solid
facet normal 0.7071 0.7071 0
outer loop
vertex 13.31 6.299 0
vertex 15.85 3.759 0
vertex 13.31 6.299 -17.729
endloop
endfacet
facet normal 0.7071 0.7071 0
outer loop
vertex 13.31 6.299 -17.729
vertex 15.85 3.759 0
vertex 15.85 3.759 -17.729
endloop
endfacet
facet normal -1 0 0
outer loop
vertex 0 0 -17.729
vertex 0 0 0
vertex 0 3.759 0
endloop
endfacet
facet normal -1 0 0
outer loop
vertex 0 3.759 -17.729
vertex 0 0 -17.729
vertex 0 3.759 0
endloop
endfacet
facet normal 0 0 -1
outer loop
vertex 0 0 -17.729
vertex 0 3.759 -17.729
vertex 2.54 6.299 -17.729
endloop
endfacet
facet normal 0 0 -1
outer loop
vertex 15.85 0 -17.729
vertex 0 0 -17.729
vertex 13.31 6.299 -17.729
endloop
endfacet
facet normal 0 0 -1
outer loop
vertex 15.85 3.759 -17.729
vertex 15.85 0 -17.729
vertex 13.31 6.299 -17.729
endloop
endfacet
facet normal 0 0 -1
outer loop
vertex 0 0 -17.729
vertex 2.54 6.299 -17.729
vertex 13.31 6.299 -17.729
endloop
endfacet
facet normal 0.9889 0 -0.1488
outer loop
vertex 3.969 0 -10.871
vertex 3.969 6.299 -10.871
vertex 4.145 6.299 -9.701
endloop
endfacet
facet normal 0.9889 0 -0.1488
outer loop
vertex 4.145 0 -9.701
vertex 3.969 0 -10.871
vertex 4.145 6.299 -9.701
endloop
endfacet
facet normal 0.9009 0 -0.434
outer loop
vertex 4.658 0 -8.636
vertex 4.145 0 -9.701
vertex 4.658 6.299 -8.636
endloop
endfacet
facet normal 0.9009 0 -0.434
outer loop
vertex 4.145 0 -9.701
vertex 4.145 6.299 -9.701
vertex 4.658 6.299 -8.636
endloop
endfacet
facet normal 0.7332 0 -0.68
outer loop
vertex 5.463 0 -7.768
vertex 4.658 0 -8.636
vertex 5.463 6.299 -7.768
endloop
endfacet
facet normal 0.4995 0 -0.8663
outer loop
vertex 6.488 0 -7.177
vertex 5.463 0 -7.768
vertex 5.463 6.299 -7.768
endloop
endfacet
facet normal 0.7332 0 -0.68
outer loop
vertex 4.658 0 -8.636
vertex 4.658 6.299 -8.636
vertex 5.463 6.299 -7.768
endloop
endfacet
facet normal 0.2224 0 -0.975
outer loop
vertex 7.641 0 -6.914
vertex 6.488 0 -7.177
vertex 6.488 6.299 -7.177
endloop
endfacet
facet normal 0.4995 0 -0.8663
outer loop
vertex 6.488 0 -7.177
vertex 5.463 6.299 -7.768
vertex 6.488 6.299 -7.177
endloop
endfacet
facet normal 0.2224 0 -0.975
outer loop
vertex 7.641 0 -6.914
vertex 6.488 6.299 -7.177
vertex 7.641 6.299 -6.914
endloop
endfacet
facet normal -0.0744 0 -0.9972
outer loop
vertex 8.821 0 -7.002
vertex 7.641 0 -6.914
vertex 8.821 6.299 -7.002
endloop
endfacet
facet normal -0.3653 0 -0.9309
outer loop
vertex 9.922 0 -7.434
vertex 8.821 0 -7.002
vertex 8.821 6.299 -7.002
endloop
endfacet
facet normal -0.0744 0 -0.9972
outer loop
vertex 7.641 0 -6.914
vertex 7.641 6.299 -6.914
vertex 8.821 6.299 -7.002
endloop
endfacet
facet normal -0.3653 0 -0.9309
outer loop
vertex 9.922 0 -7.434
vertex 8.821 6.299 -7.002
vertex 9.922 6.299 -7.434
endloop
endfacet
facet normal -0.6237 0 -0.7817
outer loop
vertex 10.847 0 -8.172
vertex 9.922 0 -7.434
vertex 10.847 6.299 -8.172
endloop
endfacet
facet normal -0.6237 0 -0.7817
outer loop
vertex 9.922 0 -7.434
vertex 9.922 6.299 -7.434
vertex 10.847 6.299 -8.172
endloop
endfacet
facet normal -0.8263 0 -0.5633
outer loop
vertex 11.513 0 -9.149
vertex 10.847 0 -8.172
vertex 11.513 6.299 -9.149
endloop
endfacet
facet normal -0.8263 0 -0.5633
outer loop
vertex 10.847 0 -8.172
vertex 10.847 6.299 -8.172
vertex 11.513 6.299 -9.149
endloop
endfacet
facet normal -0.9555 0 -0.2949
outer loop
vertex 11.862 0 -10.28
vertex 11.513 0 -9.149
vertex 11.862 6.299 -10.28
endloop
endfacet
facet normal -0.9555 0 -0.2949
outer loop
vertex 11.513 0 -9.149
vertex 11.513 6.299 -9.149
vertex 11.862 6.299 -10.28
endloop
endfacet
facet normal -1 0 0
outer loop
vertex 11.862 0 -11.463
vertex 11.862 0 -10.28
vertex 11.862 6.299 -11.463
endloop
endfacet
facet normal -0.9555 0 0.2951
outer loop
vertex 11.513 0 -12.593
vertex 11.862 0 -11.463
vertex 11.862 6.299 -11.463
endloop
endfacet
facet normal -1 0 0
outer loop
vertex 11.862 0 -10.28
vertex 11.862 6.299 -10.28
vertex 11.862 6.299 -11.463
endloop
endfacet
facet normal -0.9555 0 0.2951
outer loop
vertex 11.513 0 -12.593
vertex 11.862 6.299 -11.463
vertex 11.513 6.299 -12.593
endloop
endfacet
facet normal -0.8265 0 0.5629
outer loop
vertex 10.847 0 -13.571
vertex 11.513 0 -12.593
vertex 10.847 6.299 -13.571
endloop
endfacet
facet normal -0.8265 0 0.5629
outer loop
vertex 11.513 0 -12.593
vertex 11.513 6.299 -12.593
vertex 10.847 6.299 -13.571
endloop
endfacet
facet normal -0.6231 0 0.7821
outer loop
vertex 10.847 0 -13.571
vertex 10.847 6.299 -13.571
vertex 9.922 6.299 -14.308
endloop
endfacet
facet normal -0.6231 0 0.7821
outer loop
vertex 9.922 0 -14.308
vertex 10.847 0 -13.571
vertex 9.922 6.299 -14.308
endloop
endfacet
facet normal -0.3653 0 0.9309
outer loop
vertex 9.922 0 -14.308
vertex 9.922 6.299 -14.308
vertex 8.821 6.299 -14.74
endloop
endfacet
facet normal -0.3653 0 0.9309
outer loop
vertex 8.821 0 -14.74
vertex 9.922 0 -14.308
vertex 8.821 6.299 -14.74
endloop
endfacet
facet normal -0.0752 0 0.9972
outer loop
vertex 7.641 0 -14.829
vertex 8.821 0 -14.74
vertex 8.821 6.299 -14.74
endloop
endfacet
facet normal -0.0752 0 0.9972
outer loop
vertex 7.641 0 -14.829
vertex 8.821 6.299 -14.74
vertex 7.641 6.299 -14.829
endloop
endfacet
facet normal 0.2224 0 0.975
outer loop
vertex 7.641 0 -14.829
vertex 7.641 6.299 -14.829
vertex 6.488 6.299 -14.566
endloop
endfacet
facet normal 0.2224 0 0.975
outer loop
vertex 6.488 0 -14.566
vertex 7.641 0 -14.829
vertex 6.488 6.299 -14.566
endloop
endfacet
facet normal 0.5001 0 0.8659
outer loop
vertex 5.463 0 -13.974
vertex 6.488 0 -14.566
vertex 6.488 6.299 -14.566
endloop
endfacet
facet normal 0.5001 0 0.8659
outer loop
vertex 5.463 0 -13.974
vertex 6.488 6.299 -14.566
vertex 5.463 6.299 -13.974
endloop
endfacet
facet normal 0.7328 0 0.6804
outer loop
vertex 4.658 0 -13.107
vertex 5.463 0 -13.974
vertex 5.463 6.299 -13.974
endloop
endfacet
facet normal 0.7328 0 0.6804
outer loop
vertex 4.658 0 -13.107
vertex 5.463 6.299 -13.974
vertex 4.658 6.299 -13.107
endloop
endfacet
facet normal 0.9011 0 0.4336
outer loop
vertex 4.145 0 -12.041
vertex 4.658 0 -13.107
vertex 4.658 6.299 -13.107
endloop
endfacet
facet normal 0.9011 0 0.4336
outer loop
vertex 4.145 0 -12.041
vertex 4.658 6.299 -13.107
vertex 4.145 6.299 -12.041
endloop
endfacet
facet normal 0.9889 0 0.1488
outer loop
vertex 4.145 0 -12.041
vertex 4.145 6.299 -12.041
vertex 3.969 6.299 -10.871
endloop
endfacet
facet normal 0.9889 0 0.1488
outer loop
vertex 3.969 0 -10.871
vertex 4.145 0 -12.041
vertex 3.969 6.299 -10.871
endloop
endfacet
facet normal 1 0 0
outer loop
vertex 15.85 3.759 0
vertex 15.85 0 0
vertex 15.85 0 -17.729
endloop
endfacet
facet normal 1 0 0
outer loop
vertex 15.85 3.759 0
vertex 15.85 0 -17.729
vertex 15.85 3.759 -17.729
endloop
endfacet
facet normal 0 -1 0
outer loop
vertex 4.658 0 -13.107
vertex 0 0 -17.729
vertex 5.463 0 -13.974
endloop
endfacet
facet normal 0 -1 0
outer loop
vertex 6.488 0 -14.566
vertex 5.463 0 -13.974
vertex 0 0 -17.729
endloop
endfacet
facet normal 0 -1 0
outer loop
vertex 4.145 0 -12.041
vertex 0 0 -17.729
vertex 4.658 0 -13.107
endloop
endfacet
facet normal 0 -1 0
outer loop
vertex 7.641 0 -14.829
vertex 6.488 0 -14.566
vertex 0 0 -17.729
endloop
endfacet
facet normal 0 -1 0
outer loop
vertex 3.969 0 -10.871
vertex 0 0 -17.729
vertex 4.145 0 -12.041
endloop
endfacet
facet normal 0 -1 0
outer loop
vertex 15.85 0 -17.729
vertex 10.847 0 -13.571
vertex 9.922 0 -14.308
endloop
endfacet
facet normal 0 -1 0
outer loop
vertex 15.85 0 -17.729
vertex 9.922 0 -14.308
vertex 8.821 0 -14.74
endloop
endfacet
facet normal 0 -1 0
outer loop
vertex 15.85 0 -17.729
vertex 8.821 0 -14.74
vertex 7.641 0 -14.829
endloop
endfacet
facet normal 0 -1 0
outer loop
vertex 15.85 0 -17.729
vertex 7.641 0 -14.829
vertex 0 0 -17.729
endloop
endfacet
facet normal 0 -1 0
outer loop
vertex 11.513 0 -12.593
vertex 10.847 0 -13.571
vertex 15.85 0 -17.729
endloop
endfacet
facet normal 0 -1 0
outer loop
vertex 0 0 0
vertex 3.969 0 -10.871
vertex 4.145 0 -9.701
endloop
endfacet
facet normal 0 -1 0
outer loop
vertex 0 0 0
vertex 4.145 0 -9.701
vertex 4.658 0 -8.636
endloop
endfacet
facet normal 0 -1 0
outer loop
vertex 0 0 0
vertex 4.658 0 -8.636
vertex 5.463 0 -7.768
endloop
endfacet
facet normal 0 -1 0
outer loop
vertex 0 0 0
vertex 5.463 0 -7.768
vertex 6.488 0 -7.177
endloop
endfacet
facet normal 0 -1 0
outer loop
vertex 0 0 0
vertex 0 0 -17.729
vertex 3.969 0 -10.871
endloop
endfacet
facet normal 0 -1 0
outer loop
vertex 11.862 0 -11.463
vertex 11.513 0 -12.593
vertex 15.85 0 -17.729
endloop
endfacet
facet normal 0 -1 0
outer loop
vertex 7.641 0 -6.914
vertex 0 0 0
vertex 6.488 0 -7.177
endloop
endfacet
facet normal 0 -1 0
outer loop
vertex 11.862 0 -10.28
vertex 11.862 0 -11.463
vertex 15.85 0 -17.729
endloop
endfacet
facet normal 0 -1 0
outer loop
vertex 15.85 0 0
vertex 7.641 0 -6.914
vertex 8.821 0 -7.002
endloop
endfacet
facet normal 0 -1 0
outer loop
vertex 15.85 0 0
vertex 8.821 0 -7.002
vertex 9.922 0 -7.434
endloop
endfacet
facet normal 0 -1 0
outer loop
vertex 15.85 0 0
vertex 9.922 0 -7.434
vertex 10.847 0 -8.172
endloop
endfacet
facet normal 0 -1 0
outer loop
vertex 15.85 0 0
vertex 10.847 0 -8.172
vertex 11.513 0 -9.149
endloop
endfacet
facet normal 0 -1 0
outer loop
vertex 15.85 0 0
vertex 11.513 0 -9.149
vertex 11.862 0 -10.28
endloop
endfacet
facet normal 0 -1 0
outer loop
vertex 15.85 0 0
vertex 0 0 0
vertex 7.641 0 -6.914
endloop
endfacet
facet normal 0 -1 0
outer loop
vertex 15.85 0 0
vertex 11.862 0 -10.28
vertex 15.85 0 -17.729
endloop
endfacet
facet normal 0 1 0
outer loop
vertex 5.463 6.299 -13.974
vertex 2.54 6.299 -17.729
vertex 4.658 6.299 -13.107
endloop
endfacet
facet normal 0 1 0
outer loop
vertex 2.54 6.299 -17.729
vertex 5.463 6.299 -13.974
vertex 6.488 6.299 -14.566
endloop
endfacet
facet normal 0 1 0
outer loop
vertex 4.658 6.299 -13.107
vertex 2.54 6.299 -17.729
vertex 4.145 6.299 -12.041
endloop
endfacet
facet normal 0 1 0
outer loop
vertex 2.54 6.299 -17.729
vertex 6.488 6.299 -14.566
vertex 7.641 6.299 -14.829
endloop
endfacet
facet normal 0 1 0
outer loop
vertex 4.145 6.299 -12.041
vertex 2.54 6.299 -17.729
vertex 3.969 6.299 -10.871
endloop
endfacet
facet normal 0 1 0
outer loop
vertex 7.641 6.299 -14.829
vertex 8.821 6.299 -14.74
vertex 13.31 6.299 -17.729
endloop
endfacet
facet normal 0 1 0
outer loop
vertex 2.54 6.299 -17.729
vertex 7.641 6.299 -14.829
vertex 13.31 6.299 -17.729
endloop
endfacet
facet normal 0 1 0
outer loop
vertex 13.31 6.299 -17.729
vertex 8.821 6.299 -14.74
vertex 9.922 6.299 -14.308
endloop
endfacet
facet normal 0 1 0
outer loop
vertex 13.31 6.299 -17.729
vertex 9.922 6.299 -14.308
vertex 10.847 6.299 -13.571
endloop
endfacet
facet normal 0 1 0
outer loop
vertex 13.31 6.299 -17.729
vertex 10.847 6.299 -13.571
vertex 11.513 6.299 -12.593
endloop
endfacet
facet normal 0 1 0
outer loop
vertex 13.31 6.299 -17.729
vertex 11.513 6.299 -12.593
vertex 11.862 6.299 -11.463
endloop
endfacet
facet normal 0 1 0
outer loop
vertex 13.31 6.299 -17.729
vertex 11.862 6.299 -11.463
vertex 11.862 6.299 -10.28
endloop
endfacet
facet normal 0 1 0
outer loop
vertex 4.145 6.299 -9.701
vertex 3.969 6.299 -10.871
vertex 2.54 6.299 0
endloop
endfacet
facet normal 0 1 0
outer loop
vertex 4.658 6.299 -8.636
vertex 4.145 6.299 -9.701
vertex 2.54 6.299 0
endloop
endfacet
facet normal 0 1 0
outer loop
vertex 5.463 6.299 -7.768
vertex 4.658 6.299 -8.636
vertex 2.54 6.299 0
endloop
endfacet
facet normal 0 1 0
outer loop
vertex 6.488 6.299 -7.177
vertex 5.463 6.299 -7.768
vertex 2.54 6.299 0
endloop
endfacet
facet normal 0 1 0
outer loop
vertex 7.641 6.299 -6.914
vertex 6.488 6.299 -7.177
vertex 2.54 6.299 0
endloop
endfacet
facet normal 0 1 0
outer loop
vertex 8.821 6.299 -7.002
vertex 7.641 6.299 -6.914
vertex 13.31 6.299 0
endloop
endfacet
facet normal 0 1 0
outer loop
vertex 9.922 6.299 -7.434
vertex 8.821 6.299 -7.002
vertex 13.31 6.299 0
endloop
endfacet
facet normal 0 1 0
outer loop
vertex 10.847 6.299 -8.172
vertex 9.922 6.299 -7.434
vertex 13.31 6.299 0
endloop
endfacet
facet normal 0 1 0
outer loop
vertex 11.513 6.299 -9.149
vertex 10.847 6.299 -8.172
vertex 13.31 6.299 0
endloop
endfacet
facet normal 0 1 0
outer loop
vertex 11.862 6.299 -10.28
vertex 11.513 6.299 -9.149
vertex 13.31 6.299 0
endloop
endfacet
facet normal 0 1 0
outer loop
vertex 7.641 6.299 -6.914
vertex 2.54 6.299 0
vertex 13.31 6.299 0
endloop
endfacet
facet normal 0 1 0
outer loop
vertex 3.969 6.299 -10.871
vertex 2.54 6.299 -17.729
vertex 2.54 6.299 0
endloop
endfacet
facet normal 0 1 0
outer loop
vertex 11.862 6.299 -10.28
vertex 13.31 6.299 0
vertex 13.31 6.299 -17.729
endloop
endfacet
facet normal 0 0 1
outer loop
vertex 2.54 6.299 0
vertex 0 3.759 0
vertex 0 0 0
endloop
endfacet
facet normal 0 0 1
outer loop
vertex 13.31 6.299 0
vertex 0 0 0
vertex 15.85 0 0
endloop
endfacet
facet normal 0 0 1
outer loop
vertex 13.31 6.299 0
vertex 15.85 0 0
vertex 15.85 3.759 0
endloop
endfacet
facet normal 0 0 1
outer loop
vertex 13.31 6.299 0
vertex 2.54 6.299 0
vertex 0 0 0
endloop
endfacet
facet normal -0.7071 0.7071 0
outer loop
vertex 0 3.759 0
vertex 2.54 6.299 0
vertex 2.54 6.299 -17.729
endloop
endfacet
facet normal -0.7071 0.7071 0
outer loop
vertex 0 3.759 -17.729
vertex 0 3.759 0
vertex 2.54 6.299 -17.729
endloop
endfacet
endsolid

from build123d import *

# Parameters (mm, degrees)
SKETCH1_W                          = 15.8496
SKETCH1_H                          = 6.2992
BASE_EXTRUDE_DEPTH                 = 17.7292
F_5_16_18_TAPPED_HOLE1_D           = 6.5278
F_5_16_18_TAPPED_HOLE1_CBORE_D     = 7.9375
F_5_16_18_TAPPED_HOLE1_CBORE_DEPTH = 15.875
CHAMFER1_SIZE                      = 2.54


with BuildPart() as part:
    # Sketch1 → Base-Extrude (new body)
    with BuildSketch(Plane.XY):
        with Locations((7.9248, 3.1496)):
            Rectangle(SKETCH1_W, SKETCH1_H)
    extrude(amount=-BASE_EXTRUDE_DEPTH)

    # 5/16-18 Tapped Hole1 (through all)
    with Locations(Plane(origin=(0, 6.2992, 0), x_dir=(-1, 0, 0), z_dir=(0, 1, 0))):
        with Locations((-7.9375, -10.8712)):
            CounterBoreHole(F_5_16_18_TAPPED_HOLE1_D / 2, F_5_16_18_TAPPED_HOLE1_CBORE_D / 2, F_5_16_18_TAPPED_HOLE1_CBORE_DEPTH)

    # Chamfer1
    chamfer1_edges = [part.edges().sort_by_distance(p)[0] for p in [
        (0, 6.2992, -8.8646),
        (15.8496, 6.2992, -8.8646),
    ]]
    chamfer(chamfer1_edges, length=CHAMFER1_SIZE)


solid = part.part
